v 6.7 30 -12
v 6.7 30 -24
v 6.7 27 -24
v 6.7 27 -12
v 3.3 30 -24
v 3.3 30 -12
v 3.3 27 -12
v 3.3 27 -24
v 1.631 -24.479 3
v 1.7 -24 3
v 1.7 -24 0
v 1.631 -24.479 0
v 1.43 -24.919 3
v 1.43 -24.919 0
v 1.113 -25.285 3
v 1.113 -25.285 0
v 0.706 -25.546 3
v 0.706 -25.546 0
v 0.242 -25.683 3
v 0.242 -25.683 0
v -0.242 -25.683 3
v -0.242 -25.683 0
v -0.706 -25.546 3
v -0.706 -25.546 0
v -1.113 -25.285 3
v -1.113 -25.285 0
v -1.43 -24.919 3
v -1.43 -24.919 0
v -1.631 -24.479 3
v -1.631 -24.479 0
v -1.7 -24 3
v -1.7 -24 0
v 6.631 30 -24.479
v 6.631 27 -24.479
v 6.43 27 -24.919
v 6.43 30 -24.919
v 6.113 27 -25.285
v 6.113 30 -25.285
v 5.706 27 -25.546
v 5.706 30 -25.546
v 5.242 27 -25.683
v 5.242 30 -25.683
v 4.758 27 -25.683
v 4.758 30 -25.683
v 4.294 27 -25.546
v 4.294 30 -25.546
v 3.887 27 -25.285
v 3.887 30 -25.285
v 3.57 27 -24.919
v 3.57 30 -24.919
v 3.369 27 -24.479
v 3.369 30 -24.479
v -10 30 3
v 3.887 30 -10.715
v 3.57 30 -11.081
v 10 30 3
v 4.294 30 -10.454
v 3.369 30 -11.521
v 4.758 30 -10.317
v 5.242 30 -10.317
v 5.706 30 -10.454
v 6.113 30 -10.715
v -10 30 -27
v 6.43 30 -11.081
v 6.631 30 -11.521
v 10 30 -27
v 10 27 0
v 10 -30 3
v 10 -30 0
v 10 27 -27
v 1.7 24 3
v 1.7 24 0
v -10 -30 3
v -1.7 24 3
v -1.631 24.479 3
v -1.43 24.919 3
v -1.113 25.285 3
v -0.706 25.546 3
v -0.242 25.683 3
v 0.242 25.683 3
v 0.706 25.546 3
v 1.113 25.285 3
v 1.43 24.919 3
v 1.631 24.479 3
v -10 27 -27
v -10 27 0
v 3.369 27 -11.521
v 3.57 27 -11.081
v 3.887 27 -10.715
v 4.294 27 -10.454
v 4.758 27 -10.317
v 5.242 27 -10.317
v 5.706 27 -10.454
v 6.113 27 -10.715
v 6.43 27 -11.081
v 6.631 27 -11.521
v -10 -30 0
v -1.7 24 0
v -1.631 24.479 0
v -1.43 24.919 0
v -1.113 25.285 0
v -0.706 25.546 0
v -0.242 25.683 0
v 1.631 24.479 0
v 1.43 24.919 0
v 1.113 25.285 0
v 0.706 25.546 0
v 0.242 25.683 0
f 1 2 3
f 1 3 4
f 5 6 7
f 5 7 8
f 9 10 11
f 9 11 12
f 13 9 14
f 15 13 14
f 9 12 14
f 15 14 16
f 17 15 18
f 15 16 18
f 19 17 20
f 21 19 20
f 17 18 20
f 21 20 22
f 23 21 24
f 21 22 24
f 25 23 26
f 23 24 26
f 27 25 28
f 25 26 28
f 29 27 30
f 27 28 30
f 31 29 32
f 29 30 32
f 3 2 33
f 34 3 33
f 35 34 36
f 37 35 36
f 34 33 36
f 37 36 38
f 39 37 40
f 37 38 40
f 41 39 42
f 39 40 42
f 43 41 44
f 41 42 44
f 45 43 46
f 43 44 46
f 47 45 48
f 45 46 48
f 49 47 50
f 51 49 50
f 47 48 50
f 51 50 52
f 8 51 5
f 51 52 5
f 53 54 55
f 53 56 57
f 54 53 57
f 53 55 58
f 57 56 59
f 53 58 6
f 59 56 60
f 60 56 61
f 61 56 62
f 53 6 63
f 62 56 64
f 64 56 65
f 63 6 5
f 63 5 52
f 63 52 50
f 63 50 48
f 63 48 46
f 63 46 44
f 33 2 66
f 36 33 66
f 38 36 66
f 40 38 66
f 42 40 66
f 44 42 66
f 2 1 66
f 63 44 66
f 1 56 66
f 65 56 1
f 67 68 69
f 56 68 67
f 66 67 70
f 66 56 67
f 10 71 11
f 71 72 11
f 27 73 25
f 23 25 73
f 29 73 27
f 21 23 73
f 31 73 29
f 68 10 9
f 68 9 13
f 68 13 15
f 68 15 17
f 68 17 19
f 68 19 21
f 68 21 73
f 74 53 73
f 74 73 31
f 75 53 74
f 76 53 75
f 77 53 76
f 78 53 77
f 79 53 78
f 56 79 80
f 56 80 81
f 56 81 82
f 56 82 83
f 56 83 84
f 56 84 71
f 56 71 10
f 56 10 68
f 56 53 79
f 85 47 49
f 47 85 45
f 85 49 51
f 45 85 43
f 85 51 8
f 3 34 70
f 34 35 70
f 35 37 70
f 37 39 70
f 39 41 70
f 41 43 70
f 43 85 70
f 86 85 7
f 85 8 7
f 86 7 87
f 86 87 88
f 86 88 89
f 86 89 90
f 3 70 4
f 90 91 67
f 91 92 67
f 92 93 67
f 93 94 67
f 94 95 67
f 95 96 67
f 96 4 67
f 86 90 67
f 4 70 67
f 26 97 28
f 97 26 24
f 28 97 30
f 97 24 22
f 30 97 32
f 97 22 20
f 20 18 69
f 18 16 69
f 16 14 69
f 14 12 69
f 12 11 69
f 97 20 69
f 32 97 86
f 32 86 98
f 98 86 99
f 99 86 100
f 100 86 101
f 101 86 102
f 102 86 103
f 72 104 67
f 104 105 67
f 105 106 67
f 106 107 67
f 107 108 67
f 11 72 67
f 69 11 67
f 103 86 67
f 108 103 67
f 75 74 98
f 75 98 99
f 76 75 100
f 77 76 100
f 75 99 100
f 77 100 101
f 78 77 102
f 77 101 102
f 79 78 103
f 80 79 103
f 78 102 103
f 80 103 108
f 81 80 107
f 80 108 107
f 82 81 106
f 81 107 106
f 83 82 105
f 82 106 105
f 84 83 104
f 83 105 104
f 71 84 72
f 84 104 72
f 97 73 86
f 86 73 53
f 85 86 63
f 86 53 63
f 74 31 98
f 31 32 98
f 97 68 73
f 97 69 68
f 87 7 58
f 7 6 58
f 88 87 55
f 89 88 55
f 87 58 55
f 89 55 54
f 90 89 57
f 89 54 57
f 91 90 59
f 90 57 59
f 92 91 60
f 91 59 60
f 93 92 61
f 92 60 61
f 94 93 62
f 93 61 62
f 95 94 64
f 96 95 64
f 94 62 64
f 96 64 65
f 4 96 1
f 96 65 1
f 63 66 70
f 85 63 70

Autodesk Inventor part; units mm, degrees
ref_plane "YZ Plane" through (0, 0, 0) normal (1, 0, 0) x (0, 1, 0)
ref_plane "XZ Plane" through (0, 0, 0) normal (0, 1, 0) x (-1, 0, 0)
ref_plane "XY Plane" through (0, 0, 0) normal (0, 0, 1) x (1, 0, 0)
sketch "Skizze1" plane through (0, 0, 0) normal (0, 0, 1) x (1, 0, 0)
  line L0 (-10, 30) -> (10, 30)
  line L1 (10, 30) -> (10, -30)
  line L2 (10, -30) -> (-10, -30)
  line L3 (-10, -30) -> (-10, 30)
  line L4 (-14, 0) -> (14, 0) projected
  line L5 (0, -42) -> (0, 42) projected
  line L6 (1.7, 24) -> (1.7, -24)
  line L7 (-1.7, -24) -> (-1.7, 24)
  arc A0 (1.7, 24) -> (-1.7, 24) centre (0, 24) ccw
  arc A1 (-1.7, -24) -> (1.7, -24) centre (0, -24) ccw
  point P0 (0, 0)
  dimension "d0" = 20
  dimension "d1" = 3.4
  dimension "d2" = 60
  dimension "d3" = 48
extrude "Extrusion1" add sketch "Skizze1" along normal blind 3 contours L0 L5 A0 L7 L4 L3 | L0 L1 L4 L6 A0 L5 | L4 L7 A1 L5 L2 L3 | L1 L2 L5 A1 L6 L4
sketch "Skizze2" plane through (10, -30, 0) normal (1, 0, 0) x (0, 0, -1)
  line L0 (-3, 60) -> (-3, 0) projected
  line L1 (0, 60) -> (27, 60)
  line L2 (27, 60) -> (27, 57)
  line L3 (27, 57) -> (0, 57)
  line L4 (0, 57) -> (0, 60)
  point P0 (0, 30)
  dimension "d6" = 3
  dimension "d7" = 30
extrude "Extrusion2" add sketch "Skizze2" against normal up to surface (20 mm away)
sketch "Skizze3" plane through (-10, 30, 3) normal (0, 1, 0) x (1, 0, 0)
  line L0 (0, 0) -> (20, 0) projected
  line L1 (20, 30) -> (0, 30) projected
  line L2 (10, 30) -> (10, 0)
  line L3 (13, 30) -> (17, 30)
  line L4 (17, 30) -> (17, 18.0571)
  line L5 (17, 18.0571) -> (13, 18.0571)
  line L6 (13, 18.0571) -> (13, 30)
  line L7 (16.7, 27) -> (16.7, 15)
  line L8 (13.3, 15) -> (13.3, 27)
  arc A0 (16.7, 27) -> (13.3, 27) centre (15, 27) ccw
  arc A1 (13.3, 15) -> (16.7, 15) centre (15, 15) ccw
  line L9 (15, 27) -> (15, 15)
  point P0 (10, 3)
  dimension "d10" = 3
  dimension "d11" = 4
  dimension "d12" = 2
  dimension "d13" = 3.4
  dimension "d14" = 3
  dimension "d15" = 12
extrude "Extrusion3" cut sketch "Skizze3" against normal blind 3 contours L7 A1 L8 L5 | L5 L8 A0 L7
properties part number "13_0204_065"
